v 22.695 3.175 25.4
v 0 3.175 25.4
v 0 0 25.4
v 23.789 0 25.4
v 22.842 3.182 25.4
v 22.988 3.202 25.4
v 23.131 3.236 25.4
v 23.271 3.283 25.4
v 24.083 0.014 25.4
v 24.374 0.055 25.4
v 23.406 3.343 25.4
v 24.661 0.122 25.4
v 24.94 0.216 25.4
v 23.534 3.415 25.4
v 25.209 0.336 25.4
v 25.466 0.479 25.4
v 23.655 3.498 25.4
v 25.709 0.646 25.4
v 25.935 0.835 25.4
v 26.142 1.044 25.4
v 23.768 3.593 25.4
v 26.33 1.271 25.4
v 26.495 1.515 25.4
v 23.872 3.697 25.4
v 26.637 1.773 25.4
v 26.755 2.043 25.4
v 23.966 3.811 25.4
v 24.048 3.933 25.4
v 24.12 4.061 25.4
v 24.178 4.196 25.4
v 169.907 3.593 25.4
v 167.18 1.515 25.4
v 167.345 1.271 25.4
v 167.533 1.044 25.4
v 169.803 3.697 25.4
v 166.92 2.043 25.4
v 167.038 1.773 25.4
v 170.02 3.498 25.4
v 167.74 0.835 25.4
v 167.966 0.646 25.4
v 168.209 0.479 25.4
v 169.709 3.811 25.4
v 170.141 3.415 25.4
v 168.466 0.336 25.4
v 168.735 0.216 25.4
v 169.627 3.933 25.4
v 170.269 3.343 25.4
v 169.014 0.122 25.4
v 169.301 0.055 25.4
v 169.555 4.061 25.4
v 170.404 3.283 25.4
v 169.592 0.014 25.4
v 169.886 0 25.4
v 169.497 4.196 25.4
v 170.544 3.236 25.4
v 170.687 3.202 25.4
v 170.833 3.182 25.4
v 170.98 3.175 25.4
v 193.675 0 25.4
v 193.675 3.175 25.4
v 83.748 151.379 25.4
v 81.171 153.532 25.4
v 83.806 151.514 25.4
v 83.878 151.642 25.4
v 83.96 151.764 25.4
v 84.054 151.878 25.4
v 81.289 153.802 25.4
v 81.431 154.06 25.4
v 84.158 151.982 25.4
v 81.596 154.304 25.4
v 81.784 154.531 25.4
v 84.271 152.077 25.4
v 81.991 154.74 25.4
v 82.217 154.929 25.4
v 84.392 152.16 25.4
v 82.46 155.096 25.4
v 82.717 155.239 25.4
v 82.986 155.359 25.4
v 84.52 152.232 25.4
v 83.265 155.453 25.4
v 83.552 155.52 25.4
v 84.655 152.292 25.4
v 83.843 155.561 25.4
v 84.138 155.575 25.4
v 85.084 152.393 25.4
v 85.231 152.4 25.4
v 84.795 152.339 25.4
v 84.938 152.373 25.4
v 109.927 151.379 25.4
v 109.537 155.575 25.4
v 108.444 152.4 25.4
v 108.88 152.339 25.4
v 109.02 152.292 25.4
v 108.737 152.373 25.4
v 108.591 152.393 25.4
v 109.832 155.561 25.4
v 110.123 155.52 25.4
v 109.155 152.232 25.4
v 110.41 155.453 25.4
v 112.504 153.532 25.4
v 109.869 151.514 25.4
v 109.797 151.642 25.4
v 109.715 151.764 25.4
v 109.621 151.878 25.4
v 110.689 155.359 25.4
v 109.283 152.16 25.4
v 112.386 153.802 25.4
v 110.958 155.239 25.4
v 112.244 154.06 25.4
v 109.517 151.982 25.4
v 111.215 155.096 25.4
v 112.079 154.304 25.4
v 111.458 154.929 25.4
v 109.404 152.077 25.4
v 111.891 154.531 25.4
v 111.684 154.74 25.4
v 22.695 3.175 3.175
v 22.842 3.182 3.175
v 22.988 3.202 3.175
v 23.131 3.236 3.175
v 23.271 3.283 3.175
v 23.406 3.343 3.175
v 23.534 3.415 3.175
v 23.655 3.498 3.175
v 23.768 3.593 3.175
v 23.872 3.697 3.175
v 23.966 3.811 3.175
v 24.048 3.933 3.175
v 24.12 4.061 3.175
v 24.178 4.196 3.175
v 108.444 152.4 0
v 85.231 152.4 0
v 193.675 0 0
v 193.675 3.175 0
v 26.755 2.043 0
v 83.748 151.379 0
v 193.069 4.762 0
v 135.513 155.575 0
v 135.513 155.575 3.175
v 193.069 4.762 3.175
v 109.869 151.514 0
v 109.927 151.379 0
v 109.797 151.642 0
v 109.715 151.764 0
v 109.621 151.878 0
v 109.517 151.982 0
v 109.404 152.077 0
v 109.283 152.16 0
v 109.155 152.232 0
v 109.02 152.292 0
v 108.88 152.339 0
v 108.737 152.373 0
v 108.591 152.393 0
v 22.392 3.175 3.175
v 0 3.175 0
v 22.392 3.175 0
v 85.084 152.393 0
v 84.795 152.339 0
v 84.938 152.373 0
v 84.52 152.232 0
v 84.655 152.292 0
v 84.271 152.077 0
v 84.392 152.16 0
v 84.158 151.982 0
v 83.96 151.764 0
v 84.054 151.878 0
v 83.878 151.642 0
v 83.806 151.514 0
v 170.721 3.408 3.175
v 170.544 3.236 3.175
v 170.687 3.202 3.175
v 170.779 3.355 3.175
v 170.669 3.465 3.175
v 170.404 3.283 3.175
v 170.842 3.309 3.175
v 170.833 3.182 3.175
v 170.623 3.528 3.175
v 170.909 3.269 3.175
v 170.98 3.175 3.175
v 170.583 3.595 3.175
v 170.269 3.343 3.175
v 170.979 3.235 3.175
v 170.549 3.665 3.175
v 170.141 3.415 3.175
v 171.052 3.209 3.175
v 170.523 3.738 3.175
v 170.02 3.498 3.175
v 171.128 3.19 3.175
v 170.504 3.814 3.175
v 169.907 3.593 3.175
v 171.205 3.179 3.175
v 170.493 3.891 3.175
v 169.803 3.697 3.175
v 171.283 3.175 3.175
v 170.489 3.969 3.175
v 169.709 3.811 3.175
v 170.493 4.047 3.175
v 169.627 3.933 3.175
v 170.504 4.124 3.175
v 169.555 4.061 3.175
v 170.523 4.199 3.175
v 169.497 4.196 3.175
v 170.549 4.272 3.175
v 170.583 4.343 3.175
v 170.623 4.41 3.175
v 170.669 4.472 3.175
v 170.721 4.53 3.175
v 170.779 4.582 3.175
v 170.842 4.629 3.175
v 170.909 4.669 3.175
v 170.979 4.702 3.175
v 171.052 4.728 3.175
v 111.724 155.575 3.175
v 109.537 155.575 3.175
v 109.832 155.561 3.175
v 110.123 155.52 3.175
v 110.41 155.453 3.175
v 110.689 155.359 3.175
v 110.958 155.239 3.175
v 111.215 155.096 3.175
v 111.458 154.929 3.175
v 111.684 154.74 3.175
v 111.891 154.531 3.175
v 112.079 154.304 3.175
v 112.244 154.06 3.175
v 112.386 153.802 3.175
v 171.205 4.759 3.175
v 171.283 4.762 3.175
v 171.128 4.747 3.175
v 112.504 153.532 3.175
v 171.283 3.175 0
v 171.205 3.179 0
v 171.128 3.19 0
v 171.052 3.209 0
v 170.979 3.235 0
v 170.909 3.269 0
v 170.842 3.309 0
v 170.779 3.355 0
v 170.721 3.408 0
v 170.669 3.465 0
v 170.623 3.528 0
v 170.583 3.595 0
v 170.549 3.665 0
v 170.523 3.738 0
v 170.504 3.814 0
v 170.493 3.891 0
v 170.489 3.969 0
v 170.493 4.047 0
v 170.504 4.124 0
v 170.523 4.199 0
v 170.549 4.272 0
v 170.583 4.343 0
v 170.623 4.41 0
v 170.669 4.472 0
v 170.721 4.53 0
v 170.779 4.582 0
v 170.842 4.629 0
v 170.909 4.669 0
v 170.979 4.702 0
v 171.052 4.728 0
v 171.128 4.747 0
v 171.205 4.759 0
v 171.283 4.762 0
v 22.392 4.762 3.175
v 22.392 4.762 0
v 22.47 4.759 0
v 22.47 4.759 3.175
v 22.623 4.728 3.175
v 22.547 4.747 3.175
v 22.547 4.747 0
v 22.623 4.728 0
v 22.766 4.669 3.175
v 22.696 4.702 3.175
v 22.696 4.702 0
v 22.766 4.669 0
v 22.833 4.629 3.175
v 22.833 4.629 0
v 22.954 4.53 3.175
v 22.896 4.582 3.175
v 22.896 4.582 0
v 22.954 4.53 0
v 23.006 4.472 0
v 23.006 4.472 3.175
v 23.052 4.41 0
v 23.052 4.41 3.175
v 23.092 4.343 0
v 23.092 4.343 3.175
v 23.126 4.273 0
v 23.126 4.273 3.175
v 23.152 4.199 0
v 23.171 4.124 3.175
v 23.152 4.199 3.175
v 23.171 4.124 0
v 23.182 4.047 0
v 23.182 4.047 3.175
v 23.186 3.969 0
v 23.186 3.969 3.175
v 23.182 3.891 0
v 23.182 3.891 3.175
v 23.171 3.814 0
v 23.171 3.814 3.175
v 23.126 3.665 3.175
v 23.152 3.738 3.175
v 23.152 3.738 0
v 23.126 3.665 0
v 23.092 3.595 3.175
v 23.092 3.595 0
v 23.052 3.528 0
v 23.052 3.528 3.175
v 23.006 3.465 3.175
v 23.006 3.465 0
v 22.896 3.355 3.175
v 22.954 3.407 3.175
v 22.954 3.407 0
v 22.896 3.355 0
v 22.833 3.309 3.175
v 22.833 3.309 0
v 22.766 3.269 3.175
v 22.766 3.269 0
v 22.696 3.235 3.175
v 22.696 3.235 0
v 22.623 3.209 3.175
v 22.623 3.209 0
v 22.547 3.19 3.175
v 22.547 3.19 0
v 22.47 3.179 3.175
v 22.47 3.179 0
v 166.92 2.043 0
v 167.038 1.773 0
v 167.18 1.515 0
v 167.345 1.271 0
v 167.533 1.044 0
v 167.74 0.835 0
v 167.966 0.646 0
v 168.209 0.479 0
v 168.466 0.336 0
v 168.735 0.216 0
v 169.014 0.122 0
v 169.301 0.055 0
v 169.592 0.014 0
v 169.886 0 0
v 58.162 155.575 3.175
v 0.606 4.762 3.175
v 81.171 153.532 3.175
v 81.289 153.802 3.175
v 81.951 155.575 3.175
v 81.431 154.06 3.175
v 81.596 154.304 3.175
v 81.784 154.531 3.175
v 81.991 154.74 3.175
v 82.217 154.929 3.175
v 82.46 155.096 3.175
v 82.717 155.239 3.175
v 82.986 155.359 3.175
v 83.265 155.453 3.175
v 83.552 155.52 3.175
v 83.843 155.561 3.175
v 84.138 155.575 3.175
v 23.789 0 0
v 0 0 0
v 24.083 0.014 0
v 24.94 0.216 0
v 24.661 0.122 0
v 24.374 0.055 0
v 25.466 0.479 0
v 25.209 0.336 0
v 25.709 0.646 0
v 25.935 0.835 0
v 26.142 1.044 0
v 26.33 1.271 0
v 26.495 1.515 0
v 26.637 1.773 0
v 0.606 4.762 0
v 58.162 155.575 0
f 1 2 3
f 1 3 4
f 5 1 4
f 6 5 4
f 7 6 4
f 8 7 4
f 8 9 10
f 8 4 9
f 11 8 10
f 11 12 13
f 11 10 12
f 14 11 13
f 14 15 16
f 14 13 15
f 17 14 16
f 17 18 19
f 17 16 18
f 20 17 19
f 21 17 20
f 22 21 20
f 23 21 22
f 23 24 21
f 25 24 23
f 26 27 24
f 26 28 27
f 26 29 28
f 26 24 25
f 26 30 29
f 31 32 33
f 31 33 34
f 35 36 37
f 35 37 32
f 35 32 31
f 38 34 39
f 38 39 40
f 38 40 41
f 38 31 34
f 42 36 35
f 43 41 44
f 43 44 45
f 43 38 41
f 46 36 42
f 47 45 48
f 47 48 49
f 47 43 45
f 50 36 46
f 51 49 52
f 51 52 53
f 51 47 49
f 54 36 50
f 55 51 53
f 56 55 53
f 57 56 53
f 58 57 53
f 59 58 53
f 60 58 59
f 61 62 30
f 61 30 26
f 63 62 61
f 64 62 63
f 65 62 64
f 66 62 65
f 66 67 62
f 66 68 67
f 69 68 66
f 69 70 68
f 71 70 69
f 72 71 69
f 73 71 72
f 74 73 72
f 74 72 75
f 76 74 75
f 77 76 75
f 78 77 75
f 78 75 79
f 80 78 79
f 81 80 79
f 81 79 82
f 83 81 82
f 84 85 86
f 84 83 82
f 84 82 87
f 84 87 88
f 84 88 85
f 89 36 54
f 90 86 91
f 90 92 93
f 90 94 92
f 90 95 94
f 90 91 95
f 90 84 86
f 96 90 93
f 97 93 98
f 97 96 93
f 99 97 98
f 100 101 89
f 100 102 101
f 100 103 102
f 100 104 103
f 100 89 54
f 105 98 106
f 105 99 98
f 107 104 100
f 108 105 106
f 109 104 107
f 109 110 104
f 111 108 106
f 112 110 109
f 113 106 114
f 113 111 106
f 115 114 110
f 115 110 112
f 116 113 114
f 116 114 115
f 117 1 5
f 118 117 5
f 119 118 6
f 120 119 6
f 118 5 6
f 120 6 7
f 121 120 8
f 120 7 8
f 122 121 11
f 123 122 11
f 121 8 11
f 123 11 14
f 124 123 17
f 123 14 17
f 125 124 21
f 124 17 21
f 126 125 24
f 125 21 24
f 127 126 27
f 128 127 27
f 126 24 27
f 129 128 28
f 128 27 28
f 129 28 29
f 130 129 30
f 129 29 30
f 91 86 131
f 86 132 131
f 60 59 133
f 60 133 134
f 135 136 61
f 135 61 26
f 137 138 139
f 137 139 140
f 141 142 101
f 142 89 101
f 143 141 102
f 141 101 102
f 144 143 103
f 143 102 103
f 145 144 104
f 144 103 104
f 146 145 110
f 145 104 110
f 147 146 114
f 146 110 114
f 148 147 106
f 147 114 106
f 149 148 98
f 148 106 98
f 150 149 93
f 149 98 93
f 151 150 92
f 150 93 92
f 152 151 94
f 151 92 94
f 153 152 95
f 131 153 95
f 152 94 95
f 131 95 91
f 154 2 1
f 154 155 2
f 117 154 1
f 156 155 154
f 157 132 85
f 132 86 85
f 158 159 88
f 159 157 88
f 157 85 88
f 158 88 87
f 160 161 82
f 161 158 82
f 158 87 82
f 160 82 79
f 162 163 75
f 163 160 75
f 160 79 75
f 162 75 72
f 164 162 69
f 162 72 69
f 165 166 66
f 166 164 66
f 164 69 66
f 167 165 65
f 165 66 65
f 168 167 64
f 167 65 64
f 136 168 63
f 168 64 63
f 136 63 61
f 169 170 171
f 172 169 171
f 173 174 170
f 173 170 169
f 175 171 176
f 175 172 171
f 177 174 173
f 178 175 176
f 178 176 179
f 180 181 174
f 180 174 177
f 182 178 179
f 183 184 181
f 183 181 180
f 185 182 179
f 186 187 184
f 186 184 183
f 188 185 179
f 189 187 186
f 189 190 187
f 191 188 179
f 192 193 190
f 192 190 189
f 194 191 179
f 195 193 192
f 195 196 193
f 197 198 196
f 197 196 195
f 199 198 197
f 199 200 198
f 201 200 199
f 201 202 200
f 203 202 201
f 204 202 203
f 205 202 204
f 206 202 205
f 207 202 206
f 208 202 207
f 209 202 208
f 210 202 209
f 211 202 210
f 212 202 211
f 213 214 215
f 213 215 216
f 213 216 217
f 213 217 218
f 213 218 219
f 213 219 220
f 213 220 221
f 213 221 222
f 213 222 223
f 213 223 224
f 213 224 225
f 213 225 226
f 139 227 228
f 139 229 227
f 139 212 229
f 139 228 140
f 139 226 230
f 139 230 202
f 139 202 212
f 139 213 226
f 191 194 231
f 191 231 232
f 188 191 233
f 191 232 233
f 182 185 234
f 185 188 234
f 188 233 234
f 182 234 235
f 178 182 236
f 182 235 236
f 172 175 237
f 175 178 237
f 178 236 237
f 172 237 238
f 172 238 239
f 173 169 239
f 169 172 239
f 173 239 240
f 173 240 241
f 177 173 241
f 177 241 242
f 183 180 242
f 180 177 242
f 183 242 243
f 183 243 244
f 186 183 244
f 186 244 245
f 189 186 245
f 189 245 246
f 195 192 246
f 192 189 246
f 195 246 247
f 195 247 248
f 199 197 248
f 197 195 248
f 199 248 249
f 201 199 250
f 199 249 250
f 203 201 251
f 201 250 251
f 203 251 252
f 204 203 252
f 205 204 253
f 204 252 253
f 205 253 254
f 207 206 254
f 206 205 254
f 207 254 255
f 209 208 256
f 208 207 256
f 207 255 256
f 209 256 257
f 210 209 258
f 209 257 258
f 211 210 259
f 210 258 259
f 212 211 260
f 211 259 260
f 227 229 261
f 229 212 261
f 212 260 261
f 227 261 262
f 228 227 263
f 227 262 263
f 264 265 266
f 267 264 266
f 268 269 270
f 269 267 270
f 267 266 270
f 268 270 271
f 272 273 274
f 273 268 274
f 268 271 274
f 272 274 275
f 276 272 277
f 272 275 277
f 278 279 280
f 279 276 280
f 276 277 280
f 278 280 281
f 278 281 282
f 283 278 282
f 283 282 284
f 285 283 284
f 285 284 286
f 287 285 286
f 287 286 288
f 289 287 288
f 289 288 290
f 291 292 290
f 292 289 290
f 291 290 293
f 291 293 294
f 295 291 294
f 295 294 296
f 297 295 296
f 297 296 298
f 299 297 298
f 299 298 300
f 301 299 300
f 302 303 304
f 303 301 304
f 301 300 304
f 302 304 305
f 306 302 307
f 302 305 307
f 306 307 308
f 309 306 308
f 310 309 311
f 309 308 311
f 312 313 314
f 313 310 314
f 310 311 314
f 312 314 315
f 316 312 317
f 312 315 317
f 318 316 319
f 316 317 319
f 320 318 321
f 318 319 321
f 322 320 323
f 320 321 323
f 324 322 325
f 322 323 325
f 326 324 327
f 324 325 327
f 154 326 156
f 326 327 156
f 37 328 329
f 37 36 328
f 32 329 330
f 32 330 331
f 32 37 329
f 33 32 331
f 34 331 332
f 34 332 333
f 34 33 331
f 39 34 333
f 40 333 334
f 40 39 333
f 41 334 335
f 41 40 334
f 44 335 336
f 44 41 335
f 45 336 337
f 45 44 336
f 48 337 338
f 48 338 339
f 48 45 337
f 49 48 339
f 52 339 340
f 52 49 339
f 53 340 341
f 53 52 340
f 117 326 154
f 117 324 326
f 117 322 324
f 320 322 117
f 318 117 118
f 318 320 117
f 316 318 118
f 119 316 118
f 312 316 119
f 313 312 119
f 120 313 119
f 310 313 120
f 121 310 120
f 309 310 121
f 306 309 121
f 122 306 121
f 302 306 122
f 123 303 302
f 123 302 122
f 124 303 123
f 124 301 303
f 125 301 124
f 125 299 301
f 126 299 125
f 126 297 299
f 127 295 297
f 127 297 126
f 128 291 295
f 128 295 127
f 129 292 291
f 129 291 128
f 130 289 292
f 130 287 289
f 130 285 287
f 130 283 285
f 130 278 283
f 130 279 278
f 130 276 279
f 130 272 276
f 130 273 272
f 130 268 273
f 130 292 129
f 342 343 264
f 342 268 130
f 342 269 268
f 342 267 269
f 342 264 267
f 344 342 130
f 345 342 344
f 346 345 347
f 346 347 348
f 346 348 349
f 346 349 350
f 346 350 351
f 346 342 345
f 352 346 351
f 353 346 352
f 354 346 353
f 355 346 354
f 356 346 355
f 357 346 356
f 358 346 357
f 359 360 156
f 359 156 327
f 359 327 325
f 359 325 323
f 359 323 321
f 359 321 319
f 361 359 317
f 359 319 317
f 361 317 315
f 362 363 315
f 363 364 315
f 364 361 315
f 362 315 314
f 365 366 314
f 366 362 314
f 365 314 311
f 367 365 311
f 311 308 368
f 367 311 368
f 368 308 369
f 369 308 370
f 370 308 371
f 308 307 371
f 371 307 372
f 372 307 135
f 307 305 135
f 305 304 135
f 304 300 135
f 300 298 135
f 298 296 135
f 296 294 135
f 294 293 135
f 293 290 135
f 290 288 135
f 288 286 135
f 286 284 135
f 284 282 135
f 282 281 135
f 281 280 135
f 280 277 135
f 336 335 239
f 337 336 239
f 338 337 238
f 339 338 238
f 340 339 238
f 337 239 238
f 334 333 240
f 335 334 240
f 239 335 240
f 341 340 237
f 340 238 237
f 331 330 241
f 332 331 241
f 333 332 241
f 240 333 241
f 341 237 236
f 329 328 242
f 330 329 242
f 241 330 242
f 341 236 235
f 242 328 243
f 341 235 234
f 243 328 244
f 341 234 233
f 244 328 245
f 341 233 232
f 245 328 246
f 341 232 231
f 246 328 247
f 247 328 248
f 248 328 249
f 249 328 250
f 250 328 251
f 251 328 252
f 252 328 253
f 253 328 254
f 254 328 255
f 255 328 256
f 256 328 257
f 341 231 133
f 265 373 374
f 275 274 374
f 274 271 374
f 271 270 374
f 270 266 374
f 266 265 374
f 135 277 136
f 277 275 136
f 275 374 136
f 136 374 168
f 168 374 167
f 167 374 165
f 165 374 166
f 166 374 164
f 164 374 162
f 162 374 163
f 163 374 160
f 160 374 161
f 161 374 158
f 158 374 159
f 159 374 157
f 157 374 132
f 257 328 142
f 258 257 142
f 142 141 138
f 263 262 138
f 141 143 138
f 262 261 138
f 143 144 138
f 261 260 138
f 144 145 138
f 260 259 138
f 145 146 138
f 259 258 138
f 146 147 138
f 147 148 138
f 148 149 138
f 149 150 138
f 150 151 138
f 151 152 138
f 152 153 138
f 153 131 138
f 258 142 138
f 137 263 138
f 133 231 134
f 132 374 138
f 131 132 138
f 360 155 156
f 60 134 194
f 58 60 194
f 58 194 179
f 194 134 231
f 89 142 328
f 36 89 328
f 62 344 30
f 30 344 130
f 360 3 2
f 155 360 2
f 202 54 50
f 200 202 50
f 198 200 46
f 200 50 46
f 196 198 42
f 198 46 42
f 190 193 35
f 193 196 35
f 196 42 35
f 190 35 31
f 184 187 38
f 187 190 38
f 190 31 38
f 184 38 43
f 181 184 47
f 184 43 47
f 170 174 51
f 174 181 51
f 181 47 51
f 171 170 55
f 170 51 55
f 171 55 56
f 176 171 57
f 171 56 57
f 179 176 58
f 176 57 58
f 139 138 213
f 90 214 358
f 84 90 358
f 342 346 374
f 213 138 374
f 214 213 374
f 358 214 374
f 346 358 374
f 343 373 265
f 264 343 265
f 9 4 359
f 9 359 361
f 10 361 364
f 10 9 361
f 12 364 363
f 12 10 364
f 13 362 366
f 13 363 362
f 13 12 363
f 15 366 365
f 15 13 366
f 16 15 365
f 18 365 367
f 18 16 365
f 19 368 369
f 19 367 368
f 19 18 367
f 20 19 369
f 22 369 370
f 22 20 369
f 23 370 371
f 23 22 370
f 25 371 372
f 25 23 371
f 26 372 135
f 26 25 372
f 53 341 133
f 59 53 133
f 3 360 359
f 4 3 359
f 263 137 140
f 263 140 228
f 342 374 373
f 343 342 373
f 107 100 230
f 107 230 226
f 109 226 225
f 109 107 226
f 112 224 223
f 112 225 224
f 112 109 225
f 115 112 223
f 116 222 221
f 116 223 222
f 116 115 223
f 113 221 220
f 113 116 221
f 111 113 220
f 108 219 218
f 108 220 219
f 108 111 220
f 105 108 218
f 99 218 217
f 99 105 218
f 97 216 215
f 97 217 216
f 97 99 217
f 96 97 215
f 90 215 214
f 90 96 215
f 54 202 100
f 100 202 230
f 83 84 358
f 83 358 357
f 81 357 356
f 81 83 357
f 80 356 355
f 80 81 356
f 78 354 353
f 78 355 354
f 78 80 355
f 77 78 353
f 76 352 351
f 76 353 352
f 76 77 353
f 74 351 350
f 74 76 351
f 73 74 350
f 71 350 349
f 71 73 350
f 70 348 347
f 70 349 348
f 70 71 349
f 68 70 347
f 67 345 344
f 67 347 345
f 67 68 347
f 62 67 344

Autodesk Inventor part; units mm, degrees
ref_plane "YZ Plane" through (0, 0, 0) normal (1, 0, 0) x (0, 1, 0)
ref_plane "XZ Plane" through (0, 0, 0) normal (0, 1, 0) x (-1, 0, 0)
ref_plane "XY Plane" through (0, 0, 0) normal (0, 0, 1) x (1, 0, 0)
sketch "Sketch1" plane through (0, 0, 0) normal (0, 0, 1) x (1, 0, 0)
  line L0 (0, 0) -> (193.675, 0)
  line L1 (84.1375, 152.4) -> (109.5375, 152.4)
  line L2 (84.1375, 152.4) -> (25.9752, 0)
  line L3 (109.5375, 152.4) -> (167.6998, 0)
  line L4 (58.1623, 155.575) -> (0.6059, 4.7625)
  line L5 (135.5127, 155.575) -> (193.0691, 4.7625)
  line L6 (0, 0) -> (0, 3.175)
  line L7 (0, 3.175) -> (23.7885, 3.175)
  line L8 (193.675, 0) -> (193.675, 3.175)
  line L9 (193.675, 3.175) -> (169.8865, 3.175)
  line L10 (169.8865, 3.175) -> (111.7241, 155.575)
  line L11 (111.7241, 155.575) -> (81.9509, 155.575)
  line L12 (81.9509, 155.575) -> (23.7885, 3.175)
  line L13 (58.1623, 155.575) -> (81.9509, 155.575)
  line L14 (111.7241, 155.575) -> (135.5127, 155.575)
  line L15 (0.6059, 4.7625) -> (22.3923, 4.7625)
  line L16 (193.0691, 4.7625) -> (171.2827, 4.7625)
  arc A0 (22.3923, 3.175) -> (22.3923, 4.7625) centre (22.3923, 3.9688) ccw
  arc A1 (171.2827, 4.7625) -> (171.2827, 3.175) centre (171.2827, 3.9688) ccw
  dimension "d0" = 193.675
  dimension "d1" = 25.4
  dimension "d2" = 25.4
  dimension "d3" = 25.4
  dimension "d4" = 3.175
  dimension "d5" = 3.175
  dimension "d6" = 152.4
  dimension "d7" = 1.5875
  dimension "d8" = 1.5875
  dimension "d9" = 1.5875
extrude "Extrusion1" add sketch "Sketch1" along normal blind 25.4 contours L6 L7 L12 L11 L10 L9 L8 L0 L3 L1 L2
extrude "Extrusion2" add sketch "Sketch1" along normal blind 3.175 contours A0 L15 L4 L13 L12 L7 | L9 L10 L14 L5 L16 A1
fillet "Fillet1" radius 1.5875 4 edges at (169.8865, 3.175, 14.2875) (23.7885, 3.175, 14.2875) (84.1375, 152.4, 12.7) (109.5375, 152.4, 12.7)
fillet "Fillet2" radius 3.175 4 edges at (81.9509, 155.575, 14.2875) (111.7241, 155.575, 14.2875) (25.9752, 0, 12.7) (167.6998, 0, 12.7)
equation "\"d5\" = d4"
equation "\"d7\" = 0.5 * d4"
equation "\"d9\" = d8"
properties part number "bunny throw base 2"
